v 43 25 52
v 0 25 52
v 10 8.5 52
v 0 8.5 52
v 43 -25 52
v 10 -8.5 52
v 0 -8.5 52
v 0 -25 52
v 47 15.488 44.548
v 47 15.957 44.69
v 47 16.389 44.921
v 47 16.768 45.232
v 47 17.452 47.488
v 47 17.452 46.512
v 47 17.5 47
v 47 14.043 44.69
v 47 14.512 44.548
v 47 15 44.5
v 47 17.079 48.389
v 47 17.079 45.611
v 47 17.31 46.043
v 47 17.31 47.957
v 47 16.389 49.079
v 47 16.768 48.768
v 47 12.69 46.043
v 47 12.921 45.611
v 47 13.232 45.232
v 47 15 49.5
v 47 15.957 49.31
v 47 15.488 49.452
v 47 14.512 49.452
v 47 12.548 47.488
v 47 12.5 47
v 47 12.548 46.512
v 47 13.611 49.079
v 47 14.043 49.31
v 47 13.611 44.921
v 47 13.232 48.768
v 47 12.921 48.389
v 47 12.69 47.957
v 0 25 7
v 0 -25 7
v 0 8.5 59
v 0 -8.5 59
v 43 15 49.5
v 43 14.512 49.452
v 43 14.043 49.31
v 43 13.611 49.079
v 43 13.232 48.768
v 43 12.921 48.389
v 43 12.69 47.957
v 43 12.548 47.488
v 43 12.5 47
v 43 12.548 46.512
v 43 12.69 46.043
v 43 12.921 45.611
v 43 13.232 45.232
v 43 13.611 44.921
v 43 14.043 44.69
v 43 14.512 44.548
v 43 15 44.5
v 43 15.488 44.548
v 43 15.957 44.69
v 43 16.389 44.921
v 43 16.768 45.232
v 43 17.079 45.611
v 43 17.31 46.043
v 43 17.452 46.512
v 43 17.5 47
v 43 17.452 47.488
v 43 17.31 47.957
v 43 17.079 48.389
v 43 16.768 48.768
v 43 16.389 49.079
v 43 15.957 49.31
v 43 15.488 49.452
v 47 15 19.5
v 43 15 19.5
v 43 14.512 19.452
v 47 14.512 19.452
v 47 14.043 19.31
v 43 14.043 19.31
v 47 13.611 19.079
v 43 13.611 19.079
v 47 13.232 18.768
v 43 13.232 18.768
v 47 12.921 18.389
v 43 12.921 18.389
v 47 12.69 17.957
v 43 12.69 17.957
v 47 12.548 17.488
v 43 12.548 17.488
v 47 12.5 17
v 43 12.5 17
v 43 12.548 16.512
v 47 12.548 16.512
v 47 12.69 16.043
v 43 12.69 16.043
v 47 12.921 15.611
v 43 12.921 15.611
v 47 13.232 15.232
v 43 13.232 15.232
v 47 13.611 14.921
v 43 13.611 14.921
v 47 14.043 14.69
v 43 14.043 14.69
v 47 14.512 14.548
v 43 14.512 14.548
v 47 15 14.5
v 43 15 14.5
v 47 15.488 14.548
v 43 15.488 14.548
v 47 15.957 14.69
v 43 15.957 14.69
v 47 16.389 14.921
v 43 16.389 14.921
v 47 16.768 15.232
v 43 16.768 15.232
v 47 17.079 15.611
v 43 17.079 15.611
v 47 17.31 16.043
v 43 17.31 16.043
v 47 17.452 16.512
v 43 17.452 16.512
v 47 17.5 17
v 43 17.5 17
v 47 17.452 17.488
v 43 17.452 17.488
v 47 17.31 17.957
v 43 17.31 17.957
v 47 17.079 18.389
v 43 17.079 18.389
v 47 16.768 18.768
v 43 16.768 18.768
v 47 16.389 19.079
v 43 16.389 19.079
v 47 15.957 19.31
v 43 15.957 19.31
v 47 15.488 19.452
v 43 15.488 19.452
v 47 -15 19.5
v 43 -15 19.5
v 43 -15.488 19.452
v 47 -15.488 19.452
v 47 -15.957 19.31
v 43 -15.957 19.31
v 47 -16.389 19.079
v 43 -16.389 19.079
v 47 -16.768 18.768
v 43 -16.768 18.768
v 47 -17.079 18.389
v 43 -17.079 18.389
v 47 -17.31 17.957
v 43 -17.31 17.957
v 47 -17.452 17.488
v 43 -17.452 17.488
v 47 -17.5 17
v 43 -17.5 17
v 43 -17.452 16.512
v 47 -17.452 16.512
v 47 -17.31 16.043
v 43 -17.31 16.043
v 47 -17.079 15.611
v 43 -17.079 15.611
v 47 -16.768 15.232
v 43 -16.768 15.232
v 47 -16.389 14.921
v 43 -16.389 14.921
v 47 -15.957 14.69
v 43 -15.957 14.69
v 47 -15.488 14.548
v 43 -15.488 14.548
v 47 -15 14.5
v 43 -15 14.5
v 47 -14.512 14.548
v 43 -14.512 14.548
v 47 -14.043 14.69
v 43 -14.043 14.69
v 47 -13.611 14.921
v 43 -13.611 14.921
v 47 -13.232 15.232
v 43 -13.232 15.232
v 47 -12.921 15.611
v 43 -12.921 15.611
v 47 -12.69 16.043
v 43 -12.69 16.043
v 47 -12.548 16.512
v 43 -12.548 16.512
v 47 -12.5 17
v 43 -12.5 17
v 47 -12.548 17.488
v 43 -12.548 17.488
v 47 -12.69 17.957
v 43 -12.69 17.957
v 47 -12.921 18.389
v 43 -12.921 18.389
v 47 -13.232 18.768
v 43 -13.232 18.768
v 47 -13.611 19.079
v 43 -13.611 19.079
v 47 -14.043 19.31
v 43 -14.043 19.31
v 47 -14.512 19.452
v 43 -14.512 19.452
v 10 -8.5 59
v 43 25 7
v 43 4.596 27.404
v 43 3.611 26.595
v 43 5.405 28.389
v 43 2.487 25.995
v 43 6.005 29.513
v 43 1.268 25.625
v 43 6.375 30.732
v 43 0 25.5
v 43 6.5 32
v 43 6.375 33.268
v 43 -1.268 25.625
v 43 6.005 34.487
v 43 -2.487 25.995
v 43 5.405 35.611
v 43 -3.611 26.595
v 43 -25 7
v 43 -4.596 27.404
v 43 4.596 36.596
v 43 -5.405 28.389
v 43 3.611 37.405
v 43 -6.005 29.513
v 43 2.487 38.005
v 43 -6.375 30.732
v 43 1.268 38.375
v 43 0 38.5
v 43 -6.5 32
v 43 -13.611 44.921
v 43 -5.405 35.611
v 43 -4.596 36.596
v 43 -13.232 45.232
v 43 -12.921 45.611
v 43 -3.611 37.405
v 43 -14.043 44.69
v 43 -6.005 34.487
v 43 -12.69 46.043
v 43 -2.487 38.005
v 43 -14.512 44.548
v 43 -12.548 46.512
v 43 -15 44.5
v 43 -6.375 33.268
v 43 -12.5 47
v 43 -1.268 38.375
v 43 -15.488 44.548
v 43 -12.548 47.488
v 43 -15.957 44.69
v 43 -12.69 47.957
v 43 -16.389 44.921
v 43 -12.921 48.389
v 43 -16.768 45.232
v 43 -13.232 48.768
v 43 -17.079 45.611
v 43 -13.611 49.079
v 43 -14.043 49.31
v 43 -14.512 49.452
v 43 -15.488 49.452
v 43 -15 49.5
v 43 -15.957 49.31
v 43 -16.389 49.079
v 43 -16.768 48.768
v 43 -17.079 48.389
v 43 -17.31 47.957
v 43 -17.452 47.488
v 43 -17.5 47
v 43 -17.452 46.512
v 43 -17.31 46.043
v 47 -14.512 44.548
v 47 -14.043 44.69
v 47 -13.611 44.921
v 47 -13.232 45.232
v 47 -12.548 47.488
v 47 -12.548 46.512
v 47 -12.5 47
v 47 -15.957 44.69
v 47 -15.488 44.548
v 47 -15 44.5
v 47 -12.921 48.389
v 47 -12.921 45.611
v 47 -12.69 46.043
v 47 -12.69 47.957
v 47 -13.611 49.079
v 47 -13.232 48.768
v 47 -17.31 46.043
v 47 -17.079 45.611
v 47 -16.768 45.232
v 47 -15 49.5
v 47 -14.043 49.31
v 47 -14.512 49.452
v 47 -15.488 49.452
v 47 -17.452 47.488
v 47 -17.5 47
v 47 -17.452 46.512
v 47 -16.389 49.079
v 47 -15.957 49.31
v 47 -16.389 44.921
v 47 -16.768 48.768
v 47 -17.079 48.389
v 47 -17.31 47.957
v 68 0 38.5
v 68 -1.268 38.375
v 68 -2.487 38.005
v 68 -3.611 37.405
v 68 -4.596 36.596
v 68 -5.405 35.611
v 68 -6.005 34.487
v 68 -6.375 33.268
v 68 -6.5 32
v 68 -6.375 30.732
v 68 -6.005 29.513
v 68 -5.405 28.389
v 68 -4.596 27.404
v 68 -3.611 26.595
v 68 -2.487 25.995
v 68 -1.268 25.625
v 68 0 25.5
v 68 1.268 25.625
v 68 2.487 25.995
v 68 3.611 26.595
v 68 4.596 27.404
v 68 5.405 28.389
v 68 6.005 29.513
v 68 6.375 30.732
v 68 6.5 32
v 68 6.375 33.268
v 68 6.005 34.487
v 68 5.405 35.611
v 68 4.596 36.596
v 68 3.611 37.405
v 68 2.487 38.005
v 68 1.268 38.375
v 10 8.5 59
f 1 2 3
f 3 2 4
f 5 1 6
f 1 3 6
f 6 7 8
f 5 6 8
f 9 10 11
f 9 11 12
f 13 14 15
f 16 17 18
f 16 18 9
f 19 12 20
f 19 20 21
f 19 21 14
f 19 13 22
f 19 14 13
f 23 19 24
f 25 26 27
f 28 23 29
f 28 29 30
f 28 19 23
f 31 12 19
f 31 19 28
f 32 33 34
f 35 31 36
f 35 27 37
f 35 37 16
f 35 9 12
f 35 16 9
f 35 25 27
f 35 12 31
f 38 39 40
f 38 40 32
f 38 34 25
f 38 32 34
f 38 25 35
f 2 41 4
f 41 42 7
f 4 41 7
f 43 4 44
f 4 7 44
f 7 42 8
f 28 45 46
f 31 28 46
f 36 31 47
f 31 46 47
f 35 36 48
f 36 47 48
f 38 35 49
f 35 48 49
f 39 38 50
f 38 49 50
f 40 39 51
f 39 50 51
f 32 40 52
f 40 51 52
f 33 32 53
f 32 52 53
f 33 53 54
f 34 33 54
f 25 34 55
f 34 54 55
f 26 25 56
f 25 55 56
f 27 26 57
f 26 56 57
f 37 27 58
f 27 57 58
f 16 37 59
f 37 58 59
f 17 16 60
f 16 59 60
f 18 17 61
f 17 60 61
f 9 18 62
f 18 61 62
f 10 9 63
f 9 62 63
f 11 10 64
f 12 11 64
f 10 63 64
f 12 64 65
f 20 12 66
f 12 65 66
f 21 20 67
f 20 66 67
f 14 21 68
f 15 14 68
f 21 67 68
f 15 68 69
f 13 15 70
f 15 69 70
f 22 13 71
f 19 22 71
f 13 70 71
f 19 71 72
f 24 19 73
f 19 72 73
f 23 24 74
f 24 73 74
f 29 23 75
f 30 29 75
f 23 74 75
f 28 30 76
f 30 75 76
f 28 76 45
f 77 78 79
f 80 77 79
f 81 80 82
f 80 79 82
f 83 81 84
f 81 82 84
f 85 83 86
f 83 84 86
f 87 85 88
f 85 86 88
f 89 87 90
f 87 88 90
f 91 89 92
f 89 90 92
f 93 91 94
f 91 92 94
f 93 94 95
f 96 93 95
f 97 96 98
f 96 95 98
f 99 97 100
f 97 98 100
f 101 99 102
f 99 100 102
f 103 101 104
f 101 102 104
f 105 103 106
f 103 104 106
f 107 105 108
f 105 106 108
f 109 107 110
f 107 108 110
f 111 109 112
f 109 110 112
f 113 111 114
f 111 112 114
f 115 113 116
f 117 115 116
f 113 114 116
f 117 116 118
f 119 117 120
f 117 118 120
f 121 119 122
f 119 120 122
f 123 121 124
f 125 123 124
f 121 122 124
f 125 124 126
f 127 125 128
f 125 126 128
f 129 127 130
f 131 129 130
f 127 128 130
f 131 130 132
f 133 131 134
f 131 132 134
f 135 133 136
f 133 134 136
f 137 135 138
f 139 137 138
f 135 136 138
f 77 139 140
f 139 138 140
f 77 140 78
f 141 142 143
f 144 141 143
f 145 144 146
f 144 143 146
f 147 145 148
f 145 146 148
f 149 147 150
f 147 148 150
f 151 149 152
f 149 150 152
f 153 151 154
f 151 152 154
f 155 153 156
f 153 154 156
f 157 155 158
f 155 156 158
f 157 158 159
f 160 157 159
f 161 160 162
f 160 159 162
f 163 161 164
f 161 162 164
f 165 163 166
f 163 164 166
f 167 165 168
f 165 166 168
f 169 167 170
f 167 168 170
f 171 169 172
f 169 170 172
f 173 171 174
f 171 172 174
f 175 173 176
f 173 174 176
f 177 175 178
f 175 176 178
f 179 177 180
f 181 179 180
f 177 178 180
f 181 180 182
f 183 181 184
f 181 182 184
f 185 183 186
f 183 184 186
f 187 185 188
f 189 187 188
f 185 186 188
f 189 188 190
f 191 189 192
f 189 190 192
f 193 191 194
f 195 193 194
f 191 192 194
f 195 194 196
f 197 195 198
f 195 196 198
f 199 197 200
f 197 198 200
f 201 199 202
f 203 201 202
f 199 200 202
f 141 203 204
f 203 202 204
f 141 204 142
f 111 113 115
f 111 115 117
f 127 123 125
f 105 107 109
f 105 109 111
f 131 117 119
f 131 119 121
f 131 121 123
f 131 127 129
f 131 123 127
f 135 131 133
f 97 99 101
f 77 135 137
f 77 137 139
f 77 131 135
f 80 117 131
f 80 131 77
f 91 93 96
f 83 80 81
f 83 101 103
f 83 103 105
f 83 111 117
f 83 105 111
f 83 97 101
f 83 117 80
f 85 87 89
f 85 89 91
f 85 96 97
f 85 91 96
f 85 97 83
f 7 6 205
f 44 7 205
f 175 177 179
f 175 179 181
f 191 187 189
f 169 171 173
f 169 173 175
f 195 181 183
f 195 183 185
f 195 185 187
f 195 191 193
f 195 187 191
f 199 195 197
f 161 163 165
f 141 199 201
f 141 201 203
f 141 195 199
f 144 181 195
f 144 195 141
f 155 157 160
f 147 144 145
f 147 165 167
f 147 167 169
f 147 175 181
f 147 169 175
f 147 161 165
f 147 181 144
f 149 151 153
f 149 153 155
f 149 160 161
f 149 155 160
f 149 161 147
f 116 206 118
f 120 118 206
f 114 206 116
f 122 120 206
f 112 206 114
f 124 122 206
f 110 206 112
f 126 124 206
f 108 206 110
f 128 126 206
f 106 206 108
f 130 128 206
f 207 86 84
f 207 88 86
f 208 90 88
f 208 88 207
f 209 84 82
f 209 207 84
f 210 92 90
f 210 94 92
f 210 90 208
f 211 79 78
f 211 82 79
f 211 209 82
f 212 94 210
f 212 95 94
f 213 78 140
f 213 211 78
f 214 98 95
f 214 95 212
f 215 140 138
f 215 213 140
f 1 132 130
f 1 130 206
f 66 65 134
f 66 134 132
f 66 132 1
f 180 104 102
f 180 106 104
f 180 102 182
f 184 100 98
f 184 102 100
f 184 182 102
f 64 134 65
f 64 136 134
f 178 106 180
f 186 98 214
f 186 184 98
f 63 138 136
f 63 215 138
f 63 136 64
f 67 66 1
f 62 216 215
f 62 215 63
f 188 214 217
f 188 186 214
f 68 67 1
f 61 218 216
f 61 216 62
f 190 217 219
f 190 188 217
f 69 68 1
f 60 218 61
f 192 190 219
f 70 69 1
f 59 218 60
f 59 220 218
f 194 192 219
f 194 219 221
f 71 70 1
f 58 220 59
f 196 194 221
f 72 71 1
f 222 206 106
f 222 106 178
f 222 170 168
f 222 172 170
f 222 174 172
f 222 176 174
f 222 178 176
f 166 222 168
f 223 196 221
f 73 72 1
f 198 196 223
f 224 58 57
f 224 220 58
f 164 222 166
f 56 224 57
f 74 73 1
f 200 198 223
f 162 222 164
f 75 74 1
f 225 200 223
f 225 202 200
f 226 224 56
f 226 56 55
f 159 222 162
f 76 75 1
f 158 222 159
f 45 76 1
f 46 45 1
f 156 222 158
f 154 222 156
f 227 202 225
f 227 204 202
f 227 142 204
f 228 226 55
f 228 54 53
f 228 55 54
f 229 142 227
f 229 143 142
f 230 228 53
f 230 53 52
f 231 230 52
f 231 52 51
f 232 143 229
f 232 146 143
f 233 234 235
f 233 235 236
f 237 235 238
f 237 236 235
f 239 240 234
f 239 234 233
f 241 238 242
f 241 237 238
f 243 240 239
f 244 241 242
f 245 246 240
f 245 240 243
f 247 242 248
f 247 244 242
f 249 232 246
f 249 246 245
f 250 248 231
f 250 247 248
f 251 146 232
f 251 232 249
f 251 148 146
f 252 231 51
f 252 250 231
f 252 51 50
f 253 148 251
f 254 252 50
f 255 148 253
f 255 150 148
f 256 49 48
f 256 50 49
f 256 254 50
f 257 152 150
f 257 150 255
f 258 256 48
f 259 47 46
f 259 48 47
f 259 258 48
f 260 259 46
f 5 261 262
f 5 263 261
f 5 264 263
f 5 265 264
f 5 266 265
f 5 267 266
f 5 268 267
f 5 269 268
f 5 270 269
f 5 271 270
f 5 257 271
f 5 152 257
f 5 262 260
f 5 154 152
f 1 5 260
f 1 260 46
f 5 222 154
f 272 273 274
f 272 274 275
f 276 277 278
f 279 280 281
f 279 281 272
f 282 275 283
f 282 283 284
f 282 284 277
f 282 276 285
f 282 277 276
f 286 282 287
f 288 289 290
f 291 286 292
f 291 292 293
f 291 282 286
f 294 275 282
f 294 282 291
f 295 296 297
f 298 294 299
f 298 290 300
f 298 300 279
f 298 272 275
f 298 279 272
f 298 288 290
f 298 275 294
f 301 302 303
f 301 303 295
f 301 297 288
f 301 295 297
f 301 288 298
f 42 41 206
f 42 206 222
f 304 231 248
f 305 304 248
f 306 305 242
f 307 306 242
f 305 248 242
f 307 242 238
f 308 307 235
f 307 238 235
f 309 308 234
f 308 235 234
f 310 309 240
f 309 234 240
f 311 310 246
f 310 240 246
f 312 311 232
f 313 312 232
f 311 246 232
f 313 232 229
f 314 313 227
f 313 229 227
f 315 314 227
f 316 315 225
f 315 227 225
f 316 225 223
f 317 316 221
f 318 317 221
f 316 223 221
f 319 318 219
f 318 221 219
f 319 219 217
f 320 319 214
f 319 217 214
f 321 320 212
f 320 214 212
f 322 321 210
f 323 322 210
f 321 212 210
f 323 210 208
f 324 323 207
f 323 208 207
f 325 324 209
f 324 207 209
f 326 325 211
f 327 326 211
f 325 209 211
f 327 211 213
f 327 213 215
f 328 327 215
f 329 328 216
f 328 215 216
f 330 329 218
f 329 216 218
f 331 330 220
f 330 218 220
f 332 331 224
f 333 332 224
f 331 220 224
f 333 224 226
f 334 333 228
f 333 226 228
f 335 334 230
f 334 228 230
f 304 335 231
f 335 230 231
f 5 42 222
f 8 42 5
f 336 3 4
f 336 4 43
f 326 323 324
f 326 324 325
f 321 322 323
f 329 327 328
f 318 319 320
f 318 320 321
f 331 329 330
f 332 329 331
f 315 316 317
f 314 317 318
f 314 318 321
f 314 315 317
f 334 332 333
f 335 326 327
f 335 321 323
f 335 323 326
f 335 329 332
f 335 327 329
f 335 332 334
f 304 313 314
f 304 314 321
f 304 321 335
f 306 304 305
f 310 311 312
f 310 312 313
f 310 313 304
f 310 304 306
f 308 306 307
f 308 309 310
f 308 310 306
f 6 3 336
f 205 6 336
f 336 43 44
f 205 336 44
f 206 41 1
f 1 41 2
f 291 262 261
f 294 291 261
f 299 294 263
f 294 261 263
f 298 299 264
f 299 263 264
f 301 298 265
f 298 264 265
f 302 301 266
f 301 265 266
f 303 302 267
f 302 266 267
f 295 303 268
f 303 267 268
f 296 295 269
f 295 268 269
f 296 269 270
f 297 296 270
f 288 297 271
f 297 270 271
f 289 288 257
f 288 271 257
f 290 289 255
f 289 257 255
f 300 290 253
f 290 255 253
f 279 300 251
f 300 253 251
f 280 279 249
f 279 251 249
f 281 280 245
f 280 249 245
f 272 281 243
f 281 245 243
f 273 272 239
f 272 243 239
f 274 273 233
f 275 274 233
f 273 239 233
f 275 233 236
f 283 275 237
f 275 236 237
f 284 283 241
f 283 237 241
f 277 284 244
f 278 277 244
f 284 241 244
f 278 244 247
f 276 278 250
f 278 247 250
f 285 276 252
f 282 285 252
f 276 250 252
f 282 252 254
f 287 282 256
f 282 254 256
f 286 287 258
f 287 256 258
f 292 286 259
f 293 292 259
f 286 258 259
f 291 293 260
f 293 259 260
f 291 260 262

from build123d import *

# Parameters (mm, degrees)
CYLINDER001_R             = 2.5
CYLINDER001_DEPTH         = 4
CYLINDER_R                = 6.5
CYLINDER_DEPTH            = 25
BOX_W                     = 45
BOX_H                     = 50
BOX_DEPTH                 = 43
BOX001_W                  = 7
BOX001_H                  = 17
BOX001_DEPTH              = 10
FUSION001_PITCH_ANGLE     = -90
FUSION001_PLACEMENT_ANGLE = -180


with BuildPart() as tonillo_motor:
    # Cylinder001 → Cylinder001 (new body)
    with BuildSketch(Plane(origin=(10, 10, 43), x_dir=(1, 0, 0), z_dir=(0, 0, 1))):
        Circle(CYLINDER001_R)
    extrude(amount=CYLINDER001_DEPTH)


with BuildPart() as tonillo_motor002:
    # Link001 base: copy of tonillo motor
    add(tonillo_motor.part)


with BuildPart() as tonillo_motor002_1:
    # Link001 placement: moved
    add(tonillo_motor002.part.moved(Location((30, 0, 0))))


with BuildPart() as tonillo_motor001:
    # Link base: copy of tonillo motor
    add(tonillo_motor.part)


with BuildPart() as tonillo_motor001_1:
    # Link placement: moved
    add(tonillo_motor001.part.moved(Location((0, 30, 0))))


with BuildPart() as rotor:
    # Cylinder → Cylinder (new body)
    with BuildSketch(Plane(origin=(25, 25, 43), x_dir=(1, 0, 0), z_dir=(0, 0, 1))):
        Circle(CYLINDER_R)
    extrude(amount=CYLINDER_DEPTH)


with BuildPart() as base_motor:
    # Box → Box (new body)
    with BuildSketch(Plane.XY):
        with Locations((22.5, 25)):
            Rectangle(BOX_W, BOX_H)
    extrude(amount=BOX_DEPTH)


with BuildPart() as carcasa_motor:
    # Box001 → Box001 (new body)
    with BuildSketch(Plane(origin=(45, 16.5, 0), x_dir=(1, 0, 0), z_dir=(0, 0, 1))):
        with Locations((3.5, 8.5)):
            Rectangle(BOX001_W, BOX001_H)
    extrude(amount=BOX001_DEPTH)

    # Fusion: union Base Motor
    add(base_motor.part)


with BuildPart() as motor:
    # Link002 base: copy of tonillo motor
    add(tonillo_motor.part)


with BuildPart() as motor_1:
    # Link002 placement: moved
    add(motor.part.moved(Location((30, 30, 0))))

    # Fusion001: union tonillo motor002, tonillo motor001, tonillo motor, Rotor, Carcasa motor
    add(tonillo_motor002_1.part)
    add(tonillo_motor001_1.part)
    add(tonillo_motor.part)
    add(rotor.part)
    add(carcasa_motor.part)


with BuildPart() as motor_2:
    # Fusion001 pitch: moved
    add(motor_1.part.rotate(Axis((0, 0, 0), (0, 1, 0)), FUSION001_PITCH_ANGLE))


with BuildPart() as motor_3:
    # Fusion001 placement: moved
    add(motor_2.part.moved(Location((0, 25, 7))).rotate(Axis((0, 25, 7), (0, 0, 1)), FUSION001_PLACEMENT_ANGLE))


solid = motor_3.part
